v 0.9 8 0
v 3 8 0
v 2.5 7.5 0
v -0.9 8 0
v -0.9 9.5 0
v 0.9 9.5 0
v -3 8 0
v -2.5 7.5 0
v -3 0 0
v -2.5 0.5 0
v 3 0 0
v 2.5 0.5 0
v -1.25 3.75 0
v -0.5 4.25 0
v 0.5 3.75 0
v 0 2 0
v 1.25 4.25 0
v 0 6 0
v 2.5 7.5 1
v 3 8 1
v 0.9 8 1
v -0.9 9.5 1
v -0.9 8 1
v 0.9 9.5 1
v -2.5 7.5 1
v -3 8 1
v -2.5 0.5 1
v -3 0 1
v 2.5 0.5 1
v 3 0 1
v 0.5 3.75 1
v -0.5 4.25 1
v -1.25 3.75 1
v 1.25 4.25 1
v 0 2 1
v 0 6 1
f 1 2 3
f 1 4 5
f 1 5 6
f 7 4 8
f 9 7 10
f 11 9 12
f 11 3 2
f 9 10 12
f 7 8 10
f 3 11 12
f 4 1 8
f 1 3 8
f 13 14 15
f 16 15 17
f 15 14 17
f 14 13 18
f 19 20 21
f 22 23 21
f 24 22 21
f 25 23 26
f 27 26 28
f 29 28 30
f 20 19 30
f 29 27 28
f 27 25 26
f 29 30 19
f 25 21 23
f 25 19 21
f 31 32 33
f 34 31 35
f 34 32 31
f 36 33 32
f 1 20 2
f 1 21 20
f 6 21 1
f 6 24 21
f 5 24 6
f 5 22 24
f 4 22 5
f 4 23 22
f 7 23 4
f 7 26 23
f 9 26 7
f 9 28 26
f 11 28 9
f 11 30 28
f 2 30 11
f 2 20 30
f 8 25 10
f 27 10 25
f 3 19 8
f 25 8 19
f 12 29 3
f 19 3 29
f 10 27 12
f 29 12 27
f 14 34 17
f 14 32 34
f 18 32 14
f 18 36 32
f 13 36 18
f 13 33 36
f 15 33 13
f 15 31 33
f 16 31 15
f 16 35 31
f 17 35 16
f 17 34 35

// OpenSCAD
// file: 2D/battery_symbol_2D.scad
// draws a battery symbol (2D)
// parameters:
// size - size of the battery
// line_width - width of the drawing line
 module battery_symbol_2D(size=10, line_width=0.5) {
    
    sizeX = size*6/10; 
    translate([-sizeX/2, -size/2]) { 
     
    
     difference() {
         square([sizeX, size*8/10]);
         translate([line_width,line_width,-1])
            square([sizeX-2*line_width, size*8/10-2*line_width]);
     }
     
     
     noseWidth = sizeX/5*1.5;
     
     translate([(sizeX-noseWidth)/2, size*8/10-line_width+0.001])
     difference() {
         square([noseWidth, size/5-0.001]);
         translate([line_width,line_width])
            square([noseWidth-2*line_width, size/10-2*line_width]);
     }
     
     // painting flash
     ySegment = size*8/10/4;
     xSegment = sizeX / 3;
     
     polygon(points=[
        [1.5*xSegment, 3*ySegment], //0
        [xSegment-line_width/2, 2*ySegment-line_width/2], //1 
        [2*xSegment-line_width, 2*ySegment-line_width/2], // 2
        [sizeX-1.5*xSegment, ySegment],  // 3
        [2*xSegment+line_width/2, 2*ySegment+line_width/2], // 4
        [xSegment+line_width, 2*ySegment+line_width/2]]); // 5
     
 }
  
 }
// main file
// draws a battery symbol
// parameters:
// size - size of the battery
// line_width - width of the drawing line
// height - height of the symbol (Z axis)
// centerX - if true, center horizontally
// centerY - if true, center vertically
// center - if true, center both horizontally and vertically
 use <2D/battery_symbol_2D.scad>
 module battery_symbol(size=10, line_width=0.5, height = 1, center=false, centerX=false, centerY=false) {
 
    translate([centerX || center ? 0: size/2, center || centerY ? 0 : size/2]) 
      linear_extrude(height=height)
        battery_symbol_2D(size=size, line_width = line_width);  
 }

battery_symbol(centerX=true);
